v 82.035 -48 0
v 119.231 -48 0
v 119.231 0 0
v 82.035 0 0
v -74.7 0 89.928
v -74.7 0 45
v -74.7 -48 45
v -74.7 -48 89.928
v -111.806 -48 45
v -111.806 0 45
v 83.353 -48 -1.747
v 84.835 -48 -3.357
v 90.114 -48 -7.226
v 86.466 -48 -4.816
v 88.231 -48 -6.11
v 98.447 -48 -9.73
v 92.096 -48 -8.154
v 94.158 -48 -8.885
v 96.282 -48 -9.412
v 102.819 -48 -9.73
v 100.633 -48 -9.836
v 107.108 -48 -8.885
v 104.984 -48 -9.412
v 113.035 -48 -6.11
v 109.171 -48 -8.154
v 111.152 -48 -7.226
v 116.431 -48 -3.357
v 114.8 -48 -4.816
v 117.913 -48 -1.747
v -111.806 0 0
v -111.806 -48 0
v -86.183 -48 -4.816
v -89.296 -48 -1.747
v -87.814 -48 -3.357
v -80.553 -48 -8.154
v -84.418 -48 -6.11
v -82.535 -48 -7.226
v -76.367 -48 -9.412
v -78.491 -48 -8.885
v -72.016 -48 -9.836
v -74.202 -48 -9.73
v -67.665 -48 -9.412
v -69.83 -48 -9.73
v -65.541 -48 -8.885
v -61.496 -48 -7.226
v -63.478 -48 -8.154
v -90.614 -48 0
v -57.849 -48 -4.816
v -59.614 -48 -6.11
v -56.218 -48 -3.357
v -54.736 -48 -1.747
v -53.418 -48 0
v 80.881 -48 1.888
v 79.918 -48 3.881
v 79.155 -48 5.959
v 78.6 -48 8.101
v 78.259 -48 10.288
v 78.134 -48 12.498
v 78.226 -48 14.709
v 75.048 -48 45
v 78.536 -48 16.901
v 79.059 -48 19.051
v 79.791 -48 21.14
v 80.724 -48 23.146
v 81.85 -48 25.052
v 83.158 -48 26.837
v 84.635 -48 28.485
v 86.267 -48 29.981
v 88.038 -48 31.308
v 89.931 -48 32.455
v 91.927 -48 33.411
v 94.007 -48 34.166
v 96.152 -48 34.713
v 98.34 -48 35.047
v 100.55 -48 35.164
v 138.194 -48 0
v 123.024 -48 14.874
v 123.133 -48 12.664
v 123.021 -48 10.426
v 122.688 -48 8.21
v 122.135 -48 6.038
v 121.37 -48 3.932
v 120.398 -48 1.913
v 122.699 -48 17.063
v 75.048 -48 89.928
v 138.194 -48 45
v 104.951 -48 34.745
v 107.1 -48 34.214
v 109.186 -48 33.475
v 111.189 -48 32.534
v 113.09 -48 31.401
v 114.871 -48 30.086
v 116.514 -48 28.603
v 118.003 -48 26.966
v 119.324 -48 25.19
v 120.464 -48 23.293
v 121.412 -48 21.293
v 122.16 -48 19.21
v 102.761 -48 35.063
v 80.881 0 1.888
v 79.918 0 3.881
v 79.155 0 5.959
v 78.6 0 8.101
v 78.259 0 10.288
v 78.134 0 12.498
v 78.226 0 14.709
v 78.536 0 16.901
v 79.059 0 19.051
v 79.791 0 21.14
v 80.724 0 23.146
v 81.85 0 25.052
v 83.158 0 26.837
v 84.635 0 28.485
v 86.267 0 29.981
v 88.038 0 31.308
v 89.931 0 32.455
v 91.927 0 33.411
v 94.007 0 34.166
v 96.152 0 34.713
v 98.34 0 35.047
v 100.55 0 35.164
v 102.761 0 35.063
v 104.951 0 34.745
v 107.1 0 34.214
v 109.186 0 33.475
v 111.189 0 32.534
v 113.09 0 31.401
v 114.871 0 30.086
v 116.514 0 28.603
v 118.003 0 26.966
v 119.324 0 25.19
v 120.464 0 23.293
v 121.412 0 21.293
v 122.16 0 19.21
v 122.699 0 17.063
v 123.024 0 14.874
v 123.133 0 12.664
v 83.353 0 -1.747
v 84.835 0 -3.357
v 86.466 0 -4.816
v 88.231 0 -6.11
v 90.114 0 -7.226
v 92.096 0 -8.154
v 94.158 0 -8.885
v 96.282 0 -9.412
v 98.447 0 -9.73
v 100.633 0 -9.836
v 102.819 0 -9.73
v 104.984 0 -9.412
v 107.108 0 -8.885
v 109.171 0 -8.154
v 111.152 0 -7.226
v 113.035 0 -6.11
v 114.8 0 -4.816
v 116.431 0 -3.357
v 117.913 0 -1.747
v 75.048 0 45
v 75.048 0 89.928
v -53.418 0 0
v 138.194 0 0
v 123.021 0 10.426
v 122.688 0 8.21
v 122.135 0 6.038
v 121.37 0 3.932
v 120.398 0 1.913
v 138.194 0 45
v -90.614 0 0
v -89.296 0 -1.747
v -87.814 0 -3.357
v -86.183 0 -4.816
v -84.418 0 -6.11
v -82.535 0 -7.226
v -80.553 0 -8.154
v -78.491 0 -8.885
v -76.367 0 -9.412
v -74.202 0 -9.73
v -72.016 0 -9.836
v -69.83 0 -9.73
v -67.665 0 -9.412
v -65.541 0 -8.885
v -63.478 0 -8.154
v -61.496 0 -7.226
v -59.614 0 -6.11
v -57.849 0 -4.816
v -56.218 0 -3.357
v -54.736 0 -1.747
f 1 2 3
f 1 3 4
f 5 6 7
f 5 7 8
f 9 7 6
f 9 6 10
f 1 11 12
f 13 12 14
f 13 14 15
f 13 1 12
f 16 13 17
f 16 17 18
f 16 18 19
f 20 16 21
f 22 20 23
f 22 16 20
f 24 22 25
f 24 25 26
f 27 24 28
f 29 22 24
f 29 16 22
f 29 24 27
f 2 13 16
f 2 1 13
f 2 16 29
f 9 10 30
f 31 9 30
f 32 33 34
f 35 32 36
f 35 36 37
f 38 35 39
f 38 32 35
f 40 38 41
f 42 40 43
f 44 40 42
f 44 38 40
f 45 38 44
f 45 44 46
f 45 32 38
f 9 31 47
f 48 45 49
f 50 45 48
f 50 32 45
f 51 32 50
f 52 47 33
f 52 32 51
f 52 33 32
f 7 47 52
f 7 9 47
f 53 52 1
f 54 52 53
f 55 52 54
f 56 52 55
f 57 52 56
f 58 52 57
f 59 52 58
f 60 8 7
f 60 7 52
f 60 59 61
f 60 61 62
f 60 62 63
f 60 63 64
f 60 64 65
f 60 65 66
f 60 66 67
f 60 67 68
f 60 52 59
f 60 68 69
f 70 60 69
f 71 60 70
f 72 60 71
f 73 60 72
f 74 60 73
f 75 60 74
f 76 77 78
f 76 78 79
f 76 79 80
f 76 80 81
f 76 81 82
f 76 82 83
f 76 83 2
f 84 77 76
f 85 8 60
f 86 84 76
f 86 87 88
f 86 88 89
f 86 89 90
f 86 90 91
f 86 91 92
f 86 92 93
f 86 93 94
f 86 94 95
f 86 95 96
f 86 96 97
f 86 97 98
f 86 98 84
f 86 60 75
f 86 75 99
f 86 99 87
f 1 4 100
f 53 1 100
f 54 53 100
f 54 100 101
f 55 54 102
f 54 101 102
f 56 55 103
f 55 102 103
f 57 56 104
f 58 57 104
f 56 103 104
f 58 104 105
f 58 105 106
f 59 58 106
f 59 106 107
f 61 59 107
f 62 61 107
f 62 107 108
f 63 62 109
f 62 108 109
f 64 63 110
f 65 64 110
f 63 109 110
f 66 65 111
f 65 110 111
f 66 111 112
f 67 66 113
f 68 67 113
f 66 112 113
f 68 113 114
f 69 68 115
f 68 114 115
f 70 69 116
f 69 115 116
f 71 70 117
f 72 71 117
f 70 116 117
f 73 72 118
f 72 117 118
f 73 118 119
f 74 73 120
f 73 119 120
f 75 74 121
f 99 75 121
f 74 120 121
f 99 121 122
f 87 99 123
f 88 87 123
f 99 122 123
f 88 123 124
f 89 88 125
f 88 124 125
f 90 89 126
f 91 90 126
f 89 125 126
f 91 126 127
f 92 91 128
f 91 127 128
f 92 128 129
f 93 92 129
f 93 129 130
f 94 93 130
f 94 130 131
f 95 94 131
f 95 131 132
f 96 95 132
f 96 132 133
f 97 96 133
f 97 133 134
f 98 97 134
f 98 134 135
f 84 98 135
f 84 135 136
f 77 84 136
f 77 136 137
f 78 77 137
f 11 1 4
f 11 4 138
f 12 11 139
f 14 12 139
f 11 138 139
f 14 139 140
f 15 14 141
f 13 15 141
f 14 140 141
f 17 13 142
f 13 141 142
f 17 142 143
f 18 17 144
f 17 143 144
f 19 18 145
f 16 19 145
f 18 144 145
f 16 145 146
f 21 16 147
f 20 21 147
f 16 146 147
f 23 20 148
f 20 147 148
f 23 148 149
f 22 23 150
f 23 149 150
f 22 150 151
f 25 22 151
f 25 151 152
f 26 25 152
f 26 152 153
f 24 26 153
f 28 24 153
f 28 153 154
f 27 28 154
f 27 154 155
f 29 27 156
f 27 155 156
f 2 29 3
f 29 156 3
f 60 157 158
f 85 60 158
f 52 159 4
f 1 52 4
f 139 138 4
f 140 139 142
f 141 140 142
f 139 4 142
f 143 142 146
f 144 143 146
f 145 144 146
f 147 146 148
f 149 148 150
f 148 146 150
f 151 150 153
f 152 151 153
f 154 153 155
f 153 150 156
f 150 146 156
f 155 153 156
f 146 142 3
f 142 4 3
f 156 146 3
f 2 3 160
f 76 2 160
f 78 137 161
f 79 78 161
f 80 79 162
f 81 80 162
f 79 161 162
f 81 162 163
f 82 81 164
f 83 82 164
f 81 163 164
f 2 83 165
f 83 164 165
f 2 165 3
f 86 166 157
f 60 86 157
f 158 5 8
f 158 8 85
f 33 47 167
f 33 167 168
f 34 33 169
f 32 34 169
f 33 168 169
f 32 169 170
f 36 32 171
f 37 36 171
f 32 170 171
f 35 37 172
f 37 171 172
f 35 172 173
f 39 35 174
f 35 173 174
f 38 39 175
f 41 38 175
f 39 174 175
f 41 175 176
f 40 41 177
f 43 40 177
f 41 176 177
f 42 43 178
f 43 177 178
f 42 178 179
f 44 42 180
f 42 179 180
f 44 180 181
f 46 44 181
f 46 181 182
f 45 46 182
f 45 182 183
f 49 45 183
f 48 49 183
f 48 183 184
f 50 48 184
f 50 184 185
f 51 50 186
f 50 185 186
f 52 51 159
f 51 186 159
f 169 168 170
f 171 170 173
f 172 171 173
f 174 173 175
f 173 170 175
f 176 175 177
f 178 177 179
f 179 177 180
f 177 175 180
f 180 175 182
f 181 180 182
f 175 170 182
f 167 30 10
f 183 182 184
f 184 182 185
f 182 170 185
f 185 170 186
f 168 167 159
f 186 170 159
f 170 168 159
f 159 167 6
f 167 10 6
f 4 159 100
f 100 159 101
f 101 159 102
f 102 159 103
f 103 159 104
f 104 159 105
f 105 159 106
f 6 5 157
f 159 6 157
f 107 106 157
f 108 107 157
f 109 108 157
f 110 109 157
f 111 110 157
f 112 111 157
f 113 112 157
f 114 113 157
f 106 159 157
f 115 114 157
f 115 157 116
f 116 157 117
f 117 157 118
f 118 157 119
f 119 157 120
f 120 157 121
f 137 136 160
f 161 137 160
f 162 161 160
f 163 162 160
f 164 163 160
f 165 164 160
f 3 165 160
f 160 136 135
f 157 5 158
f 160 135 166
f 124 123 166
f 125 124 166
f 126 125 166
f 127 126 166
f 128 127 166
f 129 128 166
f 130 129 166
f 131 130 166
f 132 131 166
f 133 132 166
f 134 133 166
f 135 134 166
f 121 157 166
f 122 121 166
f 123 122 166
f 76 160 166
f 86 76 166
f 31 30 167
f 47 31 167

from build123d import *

# Parameters (mm, degrees)
F0_W     = 149.7483626008
F0_H     = 44.9277925491
F1_DEPTH = 48


with BuildPart() as f1:
    # F0 (on Front) → F1 (new body)
    with BuildSketch(Plane.XZ):
        with Locations((0.1737885177, 67.4638962746)):
            Rectangle(F0_W, F0_H)
        with BuildLine():
            ThreePointArc((-49.5158442855, 12.6637164503), (-78.6414845222, 34.1660626352), (-90.6137013036, 0))
            Line((-90.6137013036, 0), (-53.4179872674, 0))
            ThreePointArc((-53.4179872674, 0), (-50.5134981006, 6.0380762136), (-49.5158442855, 12.6637164503))
        make_face()
        with BuildLine():
            Line((-53.4179872674, 0), (-90.6137013036, 0))
            ThreePointArc((-90.6137013036, 0), (-72.0158442855, -9.8362835497), (-53.4179872674, 0))
        make_face()
        with BuildLine():
            Line((-74.7003927827, 45), (-111.8058860302, 45))
            Line((-111.8058860302, 45), (-111.8058860302, 0))
            Line((-111.8058860302, 0), (-90.6137013036, 0))
            ThreePointArc((-90.6137013036, 0), (-78.6414845222, 34.1660626352), (-49.5158442855, 12.6637164503))
            ThreePointArc((-49.5158442855, 12.6637164503), (-50.5134981006, 6.0380762136), (-53.4179872674, 0))
            Line((-53.4179872674, 0), (82.0352203053, 0))
            ThreePointArc((82.0352203053, 0), (94.0074370867, 34.1660626352), (123.1330773234, 12.6637164503))
            ThreePointArc((123.1330773234, 12.6637164503), (122.1354235083, 6.0380762136), (119.2309343415, 0))
            Line((119.2309343415, 0), (138.1941139698, 0))
            Line((138.1941139698, 0), (138.1941139698, 45))
            Line((138.1941139698, 45), (75.0479698181, 45))
            Line((75.0479698181, 45), (-74.7003927827, 45))
        make_face()
    extrude(amount=F1_DEPTH)


with BuildPart() as f1b:
    # F0 (on Front) → F1, piece 2 (new body)
    with BuildSketch(Plane.XZ):
        with BuildLine():
            Line((119.2309343415, 0), (82.0352203053, 0))
            ThreePointArc((82.0352203053, 0), (100.6330773234, -9.8362835497), (119.2309343415, 0))
        make_face()
    extrude(amount=F1_DEPTH)


solid = Compound([f1.part, f1b.part])
